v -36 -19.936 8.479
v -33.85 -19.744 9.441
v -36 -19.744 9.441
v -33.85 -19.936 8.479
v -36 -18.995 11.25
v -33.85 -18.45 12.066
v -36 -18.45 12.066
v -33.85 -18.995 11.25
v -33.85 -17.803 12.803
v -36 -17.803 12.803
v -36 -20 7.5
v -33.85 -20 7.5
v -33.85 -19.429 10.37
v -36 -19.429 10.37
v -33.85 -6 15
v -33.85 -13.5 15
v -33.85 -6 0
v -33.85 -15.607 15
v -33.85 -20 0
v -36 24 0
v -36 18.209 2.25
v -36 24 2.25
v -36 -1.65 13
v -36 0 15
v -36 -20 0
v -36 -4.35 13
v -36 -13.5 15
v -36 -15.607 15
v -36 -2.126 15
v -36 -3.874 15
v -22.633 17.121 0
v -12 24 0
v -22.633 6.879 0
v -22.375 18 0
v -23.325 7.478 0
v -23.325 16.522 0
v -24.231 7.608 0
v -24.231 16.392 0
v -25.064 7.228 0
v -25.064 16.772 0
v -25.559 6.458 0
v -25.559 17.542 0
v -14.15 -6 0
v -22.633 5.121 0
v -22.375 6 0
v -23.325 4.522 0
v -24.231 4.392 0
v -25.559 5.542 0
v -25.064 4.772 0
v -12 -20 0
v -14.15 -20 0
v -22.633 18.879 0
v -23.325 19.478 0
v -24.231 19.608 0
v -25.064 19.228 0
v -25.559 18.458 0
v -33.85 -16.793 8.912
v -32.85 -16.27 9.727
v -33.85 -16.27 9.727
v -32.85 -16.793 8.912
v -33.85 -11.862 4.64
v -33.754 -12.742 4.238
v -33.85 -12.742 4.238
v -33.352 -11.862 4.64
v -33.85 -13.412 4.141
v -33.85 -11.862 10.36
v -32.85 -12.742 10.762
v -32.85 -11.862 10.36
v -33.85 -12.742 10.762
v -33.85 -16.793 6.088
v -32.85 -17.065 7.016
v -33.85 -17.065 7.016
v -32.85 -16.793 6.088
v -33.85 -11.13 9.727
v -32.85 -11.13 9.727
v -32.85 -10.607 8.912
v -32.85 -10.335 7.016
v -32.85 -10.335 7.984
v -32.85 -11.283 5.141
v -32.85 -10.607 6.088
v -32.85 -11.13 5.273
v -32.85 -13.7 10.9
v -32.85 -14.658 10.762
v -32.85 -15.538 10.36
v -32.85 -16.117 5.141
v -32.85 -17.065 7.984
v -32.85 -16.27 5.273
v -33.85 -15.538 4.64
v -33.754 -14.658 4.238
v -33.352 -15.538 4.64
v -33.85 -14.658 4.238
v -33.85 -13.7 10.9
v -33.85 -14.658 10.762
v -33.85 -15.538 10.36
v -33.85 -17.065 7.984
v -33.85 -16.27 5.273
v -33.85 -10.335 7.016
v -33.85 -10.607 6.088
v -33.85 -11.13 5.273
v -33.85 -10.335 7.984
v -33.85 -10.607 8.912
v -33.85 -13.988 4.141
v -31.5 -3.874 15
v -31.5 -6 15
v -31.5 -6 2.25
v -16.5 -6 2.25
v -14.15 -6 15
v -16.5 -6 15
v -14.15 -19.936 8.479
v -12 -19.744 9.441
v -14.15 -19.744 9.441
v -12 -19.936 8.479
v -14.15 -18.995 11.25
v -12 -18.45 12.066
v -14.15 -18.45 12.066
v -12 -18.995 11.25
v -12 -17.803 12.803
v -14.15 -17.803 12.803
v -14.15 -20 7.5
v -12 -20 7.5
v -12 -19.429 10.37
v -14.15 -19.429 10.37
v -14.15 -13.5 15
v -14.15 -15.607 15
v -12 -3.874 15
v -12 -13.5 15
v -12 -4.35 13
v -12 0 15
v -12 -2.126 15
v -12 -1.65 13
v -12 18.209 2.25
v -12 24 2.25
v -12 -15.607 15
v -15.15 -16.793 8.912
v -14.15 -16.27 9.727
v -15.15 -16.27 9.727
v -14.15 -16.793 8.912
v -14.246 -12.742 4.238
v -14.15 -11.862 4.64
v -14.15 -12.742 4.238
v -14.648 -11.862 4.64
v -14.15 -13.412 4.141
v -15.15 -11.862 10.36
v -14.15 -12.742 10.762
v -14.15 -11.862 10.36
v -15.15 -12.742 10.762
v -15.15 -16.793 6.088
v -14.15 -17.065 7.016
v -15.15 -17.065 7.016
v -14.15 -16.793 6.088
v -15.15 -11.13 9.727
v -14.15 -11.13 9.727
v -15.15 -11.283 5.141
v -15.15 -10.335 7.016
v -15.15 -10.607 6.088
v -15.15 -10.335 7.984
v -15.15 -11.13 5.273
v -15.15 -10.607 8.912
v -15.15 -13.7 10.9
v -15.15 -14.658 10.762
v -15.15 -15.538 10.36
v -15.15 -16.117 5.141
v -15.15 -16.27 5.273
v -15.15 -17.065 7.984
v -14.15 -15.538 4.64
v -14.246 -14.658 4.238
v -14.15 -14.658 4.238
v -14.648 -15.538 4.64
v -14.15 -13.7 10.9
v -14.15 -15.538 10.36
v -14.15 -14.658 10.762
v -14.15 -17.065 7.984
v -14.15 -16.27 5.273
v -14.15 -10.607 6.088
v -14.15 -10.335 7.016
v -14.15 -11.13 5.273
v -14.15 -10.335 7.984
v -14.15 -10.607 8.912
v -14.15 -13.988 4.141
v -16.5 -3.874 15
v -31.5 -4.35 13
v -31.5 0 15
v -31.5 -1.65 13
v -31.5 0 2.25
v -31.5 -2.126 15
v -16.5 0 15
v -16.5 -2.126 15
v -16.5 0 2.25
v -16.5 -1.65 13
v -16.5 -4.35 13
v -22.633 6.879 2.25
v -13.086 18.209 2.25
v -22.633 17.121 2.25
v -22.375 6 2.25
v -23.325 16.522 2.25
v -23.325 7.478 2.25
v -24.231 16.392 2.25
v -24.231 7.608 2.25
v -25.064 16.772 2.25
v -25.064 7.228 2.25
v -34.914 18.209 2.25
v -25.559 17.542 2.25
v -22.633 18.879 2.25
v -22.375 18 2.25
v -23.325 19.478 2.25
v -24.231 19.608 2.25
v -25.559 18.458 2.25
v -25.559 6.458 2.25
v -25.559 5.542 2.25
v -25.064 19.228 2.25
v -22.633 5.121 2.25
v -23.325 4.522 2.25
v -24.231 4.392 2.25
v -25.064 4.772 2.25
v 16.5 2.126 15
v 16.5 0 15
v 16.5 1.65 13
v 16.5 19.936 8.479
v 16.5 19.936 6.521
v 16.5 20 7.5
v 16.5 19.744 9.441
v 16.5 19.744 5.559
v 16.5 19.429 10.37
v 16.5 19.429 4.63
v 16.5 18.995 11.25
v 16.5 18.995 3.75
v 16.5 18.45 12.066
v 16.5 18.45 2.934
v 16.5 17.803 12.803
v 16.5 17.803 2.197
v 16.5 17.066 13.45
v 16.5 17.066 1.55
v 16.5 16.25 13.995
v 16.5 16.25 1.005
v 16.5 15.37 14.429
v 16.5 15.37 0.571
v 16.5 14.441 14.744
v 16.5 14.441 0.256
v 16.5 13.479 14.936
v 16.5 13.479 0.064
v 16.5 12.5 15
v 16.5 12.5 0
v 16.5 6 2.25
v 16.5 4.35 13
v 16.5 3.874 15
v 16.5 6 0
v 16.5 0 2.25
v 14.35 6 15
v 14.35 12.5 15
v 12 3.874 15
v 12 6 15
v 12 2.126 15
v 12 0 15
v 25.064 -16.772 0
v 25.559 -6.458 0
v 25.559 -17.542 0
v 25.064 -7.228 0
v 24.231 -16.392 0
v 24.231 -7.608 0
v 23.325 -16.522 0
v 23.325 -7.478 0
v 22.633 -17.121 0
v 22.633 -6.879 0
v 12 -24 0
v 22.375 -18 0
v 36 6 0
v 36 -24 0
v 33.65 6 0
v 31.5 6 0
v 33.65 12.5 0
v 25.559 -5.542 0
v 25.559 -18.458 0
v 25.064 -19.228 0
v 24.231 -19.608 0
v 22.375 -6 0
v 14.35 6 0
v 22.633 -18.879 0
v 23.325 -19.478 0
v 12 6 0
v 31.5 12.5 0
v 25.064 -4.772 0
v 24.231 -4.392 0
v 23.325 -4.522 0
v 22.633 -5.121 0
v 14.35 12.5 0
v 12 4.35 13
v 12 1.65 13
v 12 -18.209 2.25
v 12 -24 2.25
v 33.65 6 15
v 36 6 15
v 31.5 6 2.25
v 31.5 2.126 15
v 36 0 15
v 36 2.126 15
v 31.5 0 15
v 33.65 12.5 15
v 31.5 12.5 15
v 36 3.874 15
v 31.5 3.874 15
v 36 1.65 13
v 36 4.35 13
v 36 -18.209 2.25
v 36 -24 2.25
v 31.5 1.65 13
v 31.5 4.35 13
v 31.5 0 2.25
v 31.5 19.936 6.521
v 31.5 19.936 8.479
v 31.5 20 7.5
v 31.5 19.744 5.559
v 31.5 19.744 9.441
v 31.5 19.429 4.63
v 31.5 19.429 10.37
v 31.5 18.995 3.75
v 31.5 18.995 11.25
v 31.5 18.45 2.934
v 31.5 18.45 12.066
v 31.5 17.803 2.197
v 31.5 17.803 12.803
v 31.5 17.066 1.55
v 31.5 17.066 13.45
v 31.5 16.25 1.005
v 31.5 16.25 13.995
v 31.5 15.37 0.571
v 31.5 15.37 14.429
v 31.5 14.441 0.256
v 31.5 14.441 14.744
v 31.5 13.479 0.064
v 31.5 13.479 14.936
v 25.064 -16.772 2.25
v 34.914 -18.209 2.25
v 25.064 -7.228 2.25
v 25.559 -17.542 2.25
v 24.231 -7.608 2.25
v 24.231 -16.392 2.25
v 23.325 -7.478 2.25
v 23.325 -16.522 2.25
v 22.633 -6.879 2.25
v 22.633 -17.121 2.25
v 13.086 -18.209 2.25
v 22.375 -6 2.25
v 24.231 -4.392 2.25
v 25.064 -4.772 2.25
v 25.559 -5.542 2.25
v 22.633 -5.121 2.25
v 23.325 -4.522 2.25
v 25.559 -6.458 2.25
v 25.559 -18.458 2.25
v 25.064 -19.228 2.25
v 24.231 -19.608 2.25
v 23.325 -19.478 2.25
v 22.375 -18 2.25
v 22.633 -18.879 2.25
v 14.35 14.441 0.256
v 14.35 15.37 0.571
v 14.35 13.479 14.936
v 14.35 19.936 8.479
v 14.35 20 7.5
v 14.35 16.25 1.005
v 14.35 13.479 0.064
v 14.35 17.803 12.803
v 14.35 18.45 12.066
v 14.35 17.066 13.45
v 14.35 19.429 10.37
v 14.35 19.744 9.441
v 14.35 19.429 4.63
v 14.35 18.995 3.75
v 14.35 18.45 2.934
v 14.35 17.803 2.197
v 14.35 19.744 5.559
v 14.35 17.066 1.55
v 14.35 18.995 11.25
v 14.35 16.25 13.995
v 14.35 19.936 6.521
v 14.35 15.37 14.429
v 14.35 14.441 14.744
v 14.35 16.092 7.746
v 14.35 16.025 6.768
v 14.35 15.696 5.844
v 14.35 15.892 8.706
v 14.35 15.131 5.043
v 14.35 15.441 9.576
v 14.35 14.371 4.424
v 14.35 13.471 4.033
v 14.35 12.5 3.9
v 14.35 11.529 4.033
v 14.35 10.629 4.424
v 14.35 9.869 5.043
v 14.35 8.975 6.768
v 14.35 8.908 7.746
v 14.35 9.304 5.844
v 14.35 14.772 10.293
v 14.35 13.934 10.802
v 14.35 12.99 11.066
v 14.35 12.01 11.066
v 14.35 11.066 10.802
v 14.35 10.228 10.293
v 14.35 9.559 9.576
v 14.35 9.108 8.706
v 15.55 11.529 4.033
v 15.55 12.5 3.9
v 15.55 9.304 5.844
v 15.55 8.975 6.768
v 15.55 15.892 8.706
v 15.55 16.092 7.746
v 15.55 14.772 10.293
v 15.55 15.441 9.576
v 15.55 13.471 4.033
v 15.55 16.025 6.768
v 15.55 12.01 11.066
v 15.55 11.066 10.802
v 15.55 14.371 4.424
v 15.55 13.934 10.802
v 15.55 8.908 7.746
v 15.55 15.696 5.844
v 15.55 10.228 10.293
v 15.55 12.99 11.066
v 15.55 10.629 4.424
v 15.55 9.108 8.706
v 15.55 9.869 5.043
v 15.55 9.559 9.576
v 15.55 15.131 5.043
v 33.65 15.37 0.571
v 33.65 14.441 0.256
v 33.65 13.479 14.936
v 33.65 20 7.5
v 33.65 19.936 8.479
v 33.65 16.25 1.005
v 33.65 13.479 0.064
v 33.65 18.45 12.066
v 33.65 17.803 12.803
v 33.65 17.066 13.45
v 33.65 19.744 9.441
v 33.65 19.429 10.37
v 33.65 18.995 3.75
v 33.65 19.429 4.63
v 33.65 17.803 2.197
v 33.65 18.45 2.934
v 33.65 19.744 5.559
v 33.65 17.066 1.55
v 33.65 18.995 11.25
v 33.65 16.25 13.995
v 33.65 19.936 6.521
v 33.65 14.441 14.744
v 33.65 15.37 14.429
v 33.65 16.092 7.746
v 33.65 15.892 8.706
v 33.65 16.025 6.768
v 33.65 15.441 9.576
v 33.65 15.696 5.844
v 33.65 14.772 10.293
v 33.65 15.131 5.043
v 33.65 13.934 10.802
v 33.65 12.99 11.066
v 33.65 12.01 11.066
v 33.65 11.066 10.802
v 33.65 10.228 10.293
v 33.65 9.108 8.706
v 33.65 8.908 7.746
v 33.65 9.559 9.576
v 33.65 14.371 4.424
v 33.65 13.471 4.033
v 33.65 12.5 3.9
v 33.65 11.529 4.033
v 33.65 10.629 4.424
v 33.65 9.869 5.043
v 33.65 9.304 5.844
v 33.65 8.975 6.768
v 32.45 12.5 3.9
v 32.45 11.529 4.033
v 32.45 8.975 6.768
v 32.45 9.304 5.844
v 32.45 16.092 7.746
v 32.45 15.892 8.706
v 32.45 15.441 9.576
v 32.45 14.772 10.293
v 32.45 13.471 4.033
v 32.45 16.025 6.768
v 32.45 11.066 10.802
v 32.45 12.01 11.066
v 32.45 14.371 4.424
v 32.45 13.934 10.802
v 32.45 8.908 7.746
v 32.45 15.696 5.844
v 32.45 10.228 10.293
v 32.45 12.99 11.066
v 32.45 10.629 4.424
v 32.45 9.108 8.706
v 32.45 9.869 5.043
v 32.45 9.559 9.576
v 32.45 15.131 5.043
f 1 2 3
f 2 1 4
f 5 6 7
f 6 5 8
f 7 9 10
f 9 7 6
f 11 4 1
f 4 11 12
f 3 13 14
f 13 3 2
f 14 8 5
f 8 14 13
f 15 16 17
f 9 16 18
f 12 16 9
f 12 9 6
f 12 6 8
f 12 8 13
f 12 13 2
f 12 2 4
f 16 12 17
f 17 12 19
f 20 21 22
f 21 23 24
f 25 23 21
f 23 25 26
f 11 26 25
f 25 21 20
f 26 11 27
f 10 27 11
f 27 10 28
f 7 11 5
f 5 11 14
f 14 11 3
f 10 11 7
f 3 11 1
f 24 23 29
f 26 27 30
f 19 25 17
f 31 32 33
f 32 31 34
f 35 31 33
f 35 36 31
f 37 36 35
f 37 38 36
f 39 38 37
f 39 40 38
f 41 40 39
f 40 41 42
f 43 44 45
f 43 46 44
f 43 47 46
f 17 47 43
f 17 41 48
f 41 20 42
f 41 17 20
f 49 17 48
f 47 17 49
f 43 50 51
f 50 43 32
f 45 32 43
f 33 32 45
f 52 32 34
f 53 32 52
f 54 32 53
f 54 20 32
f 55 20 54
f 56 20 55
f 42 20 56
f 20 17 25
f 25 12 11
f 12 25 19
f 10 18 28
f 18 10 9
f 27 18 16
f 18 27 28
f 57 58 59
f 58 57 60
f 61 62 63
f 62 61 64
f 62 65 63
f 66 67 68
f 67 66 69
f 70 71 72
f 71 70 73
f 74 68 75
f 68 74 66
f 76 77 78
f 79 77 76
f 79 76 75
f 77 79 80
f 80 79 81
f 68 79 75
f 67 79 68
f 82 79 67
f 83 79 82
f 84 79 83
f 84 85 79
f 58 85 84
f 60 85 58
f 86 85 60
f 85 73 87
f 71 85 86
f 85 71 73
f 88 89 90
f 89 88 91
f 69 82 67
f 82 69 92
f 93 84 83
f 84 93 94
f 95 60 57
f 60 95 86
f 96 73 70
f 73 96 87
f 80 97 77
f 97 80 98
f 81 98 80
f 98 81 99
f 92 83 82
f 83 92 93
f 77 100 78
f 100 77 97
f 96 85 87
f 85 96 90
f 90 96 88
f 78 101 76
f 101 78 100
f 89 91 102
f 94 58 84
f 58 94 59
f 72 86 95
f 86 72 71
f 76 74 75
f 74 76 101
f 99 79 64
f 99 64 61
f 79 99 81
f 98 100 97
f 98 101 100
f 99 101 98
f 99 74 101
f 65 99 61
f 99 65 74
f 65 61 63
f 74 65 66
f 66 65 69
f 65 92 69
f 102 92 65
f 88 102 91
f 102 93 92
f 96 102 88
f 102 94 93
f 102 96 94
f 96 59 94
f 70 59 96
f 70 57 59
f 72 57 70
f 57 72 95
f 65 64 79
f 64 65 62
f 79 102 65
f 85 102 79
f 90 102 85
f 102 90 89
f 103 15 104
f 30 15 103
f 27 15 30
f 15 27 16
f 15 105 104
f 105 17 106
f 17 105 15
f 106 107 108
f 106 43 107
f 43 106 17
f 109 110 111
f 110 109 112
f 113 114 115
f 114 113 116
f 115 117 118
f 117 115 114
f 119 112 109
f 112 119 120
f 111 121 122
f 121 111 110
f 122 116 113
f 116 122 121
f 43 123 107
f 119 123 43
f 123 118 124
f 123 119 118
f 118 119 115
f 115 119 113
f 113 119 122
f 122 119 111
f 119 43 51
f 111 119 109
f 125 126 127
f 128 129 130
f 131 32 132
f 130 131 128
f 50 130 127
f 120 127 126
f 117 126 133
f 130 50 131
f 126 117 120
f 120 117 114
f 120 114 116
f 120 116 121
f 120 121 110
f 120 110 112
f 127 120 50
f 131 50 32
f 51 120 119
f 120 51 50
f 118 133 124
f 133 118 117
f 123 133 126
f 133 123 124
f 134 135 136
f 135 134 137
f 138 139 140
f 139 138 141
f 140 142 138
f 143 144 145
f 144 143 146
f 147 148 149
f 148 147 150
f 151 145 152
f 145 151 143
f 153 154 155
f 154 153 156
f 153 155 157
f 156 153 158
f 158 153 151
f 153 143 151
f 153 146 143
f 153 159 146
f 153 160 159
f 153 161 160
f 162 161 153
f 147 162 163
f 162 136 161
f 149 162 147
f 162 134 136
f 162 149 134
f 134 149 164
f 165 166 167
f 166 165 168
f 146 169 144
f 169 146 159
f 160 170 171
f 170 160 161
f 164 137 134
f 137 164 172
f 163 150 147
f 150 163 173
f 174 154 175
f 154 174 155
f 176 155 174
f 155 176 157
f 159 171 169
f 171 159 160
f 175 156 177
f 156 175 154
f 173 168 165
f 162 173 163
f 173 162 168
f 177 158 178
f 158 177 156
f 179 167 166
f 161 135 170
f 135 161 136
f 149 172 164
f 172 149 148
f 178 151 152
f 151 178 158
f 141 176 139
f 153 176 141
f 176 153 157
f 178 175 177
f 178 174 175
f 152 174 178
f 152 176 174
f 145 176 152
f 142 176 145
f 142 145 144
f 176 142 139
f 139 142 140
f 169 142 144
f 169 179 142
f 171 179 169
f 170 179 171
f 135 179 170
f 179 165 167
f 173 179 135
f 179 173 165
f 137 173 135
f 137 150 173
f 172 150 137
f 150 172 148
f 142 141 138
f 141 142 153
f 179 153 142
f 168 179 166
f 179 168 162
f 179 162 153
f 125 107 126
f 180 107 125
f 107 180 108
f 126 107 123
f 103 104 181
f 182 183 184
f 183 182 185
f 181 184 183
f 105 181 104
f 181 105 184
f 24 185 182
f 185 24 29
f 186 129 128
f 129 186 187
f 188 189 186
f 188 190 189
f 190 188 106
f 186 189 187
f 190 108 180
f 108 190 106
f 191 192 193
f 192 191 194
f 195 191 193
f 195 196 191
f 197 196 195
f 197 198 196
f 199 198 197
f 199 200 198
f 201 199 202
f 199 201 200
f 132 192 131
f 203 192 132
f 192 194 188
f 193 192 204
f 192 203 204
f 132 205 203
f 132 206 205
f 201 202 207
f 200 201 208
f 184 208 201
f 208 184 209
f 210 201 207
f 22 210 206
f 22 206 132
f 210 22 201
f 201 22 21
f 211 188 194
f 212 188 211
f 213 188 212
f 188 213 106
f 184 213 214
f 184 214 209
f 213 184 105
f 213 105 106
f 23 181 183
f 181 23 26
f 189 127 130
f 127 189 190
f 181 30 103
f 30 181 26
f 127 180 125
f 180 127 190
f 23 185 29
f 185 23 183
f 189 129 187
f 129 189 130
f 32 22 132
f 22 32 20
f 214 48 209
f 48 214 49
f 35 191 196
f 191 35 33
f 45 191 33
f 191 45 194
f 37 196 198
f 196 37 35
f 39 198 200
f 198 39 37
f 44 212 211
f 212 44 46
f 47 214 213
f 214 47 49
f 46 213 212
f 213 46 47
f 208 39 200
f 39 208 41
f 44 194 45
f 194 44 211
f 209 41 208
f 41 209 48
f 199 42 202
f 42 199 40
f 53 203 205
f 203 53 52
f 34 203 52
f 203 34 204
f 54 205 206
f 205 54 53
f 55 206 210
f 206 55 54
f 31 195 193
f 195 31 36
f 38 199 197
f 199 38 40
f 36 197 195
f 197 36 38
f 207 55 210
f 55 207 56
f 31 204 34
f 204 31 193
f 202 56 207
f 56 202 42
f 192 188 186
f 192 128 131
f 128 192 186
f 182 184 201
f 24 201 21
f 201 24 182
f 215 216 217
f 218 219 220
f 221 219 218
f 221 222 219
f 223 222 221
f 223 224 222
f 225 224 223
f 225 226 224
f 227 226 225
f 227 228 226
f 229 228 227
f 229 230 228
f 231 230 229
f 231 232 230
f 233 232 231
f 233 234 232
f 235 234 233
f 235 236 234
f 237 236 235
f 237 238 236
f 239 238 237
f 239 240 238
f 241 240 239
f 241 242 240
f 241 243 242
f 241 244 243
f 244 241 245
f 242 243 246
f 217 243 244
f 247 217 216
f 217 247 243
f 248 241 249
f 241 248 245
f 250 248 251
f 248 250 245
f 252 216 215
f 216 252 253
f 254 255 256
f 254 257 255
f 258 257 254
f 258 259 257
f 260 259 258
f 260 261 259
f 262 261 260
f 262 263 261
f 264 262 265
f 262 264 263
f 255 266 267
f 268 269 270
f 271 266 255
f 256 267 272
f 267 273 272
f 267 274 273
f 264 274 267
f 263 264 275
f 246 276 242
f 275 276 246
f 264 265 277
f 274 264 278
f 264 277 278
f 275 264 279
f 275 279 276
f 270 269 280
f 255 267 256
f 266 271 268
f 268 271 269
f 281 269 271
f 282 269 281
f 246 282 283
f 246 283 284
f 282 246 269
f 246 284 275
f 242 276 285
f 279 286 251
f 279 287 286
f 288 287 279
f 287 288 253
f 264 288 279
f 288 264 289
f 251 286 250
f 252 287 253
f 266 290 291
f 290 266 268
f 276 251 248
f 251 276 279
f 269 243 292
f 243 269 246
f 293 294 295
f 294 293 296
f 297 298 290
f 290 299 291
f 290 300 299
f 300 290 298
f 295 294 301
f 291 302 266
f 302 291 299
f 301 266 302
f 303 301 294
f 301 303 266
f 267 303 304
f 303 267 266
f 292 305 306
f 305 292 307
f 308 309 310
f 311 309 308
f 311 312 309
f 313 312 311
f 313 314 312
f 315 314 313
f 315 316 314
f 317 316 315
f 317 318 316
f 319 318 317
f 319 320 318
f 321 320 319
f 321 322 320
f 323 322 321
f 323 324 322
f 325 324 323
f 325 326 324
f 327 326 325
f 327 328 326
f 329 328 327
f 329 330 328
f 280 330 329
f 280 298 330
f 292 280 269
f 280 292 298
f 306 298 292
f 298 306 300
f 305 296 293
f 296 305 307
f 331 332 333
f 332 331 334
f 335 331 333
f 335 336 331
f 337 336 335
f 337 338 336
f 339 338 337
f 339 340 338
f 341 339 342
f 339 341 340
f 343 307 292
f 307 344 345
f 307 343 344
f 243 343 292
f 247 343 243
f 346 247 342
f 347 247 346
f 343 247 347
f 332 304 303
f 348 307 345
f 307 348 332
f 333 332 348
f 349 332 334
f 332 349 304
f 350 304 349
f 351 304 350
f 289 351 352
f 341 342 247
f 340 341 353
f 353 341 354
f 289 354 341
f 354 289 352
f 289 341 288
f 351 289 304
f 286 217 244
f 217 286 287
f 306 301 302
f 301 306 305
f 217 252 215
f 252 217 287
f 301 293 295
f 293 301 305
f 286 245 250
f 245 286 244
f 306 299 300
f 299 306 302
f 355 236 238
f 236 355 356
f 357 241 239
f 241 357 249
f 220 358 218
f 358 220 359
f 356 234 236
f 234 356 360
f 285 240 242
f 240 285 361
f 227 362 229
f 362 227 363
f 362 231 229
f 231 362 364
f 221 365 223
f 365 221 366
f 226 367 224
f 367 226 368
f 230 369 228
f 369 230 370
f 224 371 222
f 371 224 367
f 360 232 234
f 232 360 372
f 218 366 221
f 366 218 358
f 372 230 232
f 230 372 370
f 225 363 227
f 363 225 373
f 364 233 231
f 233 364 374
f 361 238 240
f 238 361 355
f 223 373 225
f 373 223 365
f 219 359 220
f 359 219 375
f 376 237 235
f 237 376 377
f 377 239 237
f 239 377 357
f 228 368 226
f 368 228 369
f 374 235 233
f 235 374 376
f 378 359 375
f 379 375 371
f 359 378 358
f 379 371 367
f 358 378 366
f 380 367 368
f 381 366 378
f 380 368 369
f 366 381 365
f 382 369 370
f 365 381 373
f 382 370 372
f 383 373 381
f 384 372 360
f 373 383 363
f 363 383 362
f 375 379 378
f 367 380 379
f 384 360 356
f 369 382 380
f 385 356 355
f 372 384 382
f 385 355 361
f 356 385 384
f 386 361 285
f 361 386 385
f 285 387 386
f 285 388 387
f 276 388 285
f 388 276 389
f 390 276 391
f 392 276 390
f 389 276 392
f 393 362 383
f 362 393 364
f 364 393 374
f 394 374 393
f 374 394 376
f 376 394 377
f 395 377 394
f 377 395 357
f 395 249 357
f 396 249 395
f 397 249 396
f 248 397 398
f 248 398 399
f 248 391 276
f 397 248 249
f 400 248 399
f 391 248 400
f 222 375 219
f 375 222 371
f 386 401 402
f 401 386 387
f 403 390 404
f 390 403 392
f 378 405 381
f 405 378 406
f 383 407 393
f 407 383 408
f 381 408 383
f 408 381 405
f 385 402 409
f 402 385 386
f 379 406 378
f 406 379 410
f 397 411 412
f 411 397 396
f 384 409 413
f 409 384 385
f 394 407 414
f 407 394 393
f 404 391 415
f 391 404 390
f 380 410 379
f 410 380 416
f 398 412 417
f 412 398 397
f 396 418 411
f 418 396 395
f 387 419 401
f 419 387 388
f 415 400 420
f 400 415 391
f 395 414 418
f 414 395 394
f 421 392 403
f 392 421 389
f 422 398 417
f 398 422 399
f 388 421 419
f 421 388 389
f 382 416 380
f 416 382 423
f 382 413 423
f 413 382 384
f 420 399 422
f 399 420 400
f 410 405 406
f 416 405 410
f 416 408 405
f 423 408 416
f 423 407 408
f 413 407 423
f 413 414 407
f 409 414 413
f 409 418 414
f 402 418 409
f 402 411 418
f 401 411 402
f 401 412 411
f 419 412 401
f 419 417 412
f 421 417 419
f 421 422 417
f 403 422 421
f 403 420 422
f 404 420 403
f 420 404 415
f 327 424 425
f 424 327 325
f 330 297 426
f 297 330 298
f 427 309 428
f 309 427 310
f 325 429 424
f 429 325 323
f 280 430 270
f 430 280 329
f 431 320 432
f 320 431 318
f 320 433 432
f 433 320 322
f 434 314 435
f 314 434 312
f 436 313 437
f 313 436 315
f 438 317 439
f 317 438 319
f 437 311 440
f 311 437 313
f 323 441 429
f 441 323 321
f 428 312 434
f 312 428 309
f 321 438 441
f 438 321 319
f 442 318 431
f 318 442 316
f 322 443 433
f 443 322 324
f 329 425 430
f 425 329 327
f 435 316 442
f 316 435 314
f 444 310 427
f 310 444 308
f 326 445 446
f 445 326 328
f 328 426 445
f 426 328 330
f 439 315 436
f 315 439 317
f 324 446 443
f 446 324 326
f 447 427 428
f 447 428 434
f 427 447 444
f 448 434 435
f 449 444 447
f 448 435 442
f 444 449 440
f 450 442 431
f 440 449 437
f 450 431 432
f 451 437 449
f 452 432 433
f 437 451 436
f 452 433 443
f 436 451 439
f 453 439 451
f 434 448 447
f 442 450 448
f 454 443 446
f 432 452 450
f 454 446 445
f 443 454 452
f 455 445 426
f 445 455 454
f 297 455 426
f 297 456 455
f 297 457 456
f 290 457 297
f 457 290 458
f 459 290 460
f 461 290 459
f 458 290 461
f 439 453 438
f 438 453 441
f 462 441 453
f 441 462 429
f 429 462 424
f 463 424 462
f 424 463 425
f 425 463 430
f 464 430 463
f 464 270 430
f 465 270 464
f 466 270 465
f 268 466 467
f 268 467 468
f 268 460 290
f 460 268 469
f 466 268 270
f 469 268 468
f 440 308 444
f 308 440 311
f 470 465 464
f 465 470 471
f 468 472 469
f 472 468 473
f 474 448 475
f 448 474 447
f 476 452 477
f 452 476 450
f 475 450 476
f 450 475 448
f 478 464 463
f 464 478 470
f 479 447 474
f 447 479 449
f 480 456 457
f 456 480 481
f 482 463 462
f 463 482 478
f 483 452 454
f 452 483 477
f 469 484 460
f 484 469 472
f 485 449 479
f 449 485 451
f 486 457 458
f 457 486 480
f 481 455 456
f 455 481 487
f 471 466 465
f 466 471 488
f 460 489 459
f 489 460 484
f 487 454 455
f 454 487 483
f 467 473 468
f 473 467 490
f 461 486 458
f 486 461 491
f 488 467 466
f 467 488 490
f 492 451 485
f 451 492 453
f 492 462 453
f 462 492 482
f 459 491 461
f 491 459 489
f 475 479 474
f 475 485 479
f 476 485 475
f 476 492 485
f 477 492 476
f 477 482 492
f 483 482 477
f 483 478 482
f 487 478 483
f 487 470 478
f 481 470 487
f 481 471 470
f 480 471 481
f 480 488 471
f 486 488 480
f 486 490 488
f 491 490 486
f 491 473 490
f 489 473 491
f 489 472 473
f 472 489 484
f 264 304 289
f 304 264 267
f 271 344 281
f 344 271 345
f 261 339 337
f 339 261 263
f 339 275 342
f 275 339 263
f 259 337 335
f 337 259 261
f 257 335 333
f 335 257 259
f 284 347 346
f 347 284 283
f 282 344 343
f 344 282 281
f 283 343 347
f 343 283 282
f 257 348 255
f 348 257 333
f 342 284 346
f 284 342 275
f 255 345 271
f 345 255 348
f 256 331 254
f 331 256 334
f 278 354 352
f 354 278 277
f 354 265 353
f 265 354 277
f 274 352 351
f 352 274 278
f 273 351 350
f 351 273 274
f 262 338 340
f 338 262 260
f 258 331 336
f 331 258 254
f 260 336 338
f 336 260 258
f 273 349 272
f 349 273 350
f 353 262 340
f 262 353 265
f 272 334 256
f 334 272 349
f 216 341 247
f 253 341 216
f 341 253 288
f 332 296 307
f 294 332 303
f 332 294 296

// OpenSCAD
// file: parameters.scad
tolerance = .2;

outer_width = 24;
outer_height = 15;

mid_depth = 6;

wall_thickness = 2.25;

key_diameter = 7;
key_depth = 1.1;
key_slope_bottom = 45;

clip_thickness = 2;
clip_curve_thickness = 1.75;

_trim = 1;

$fa = 3;
$fs = 1;
// file: link.scad
include<parameters.scad>;

module notch_profile(with_tolerance=false) {
    polygon([
        [clip_thickness,
         -1.25 - (with_tolerance ? tolerance/2 : 0)],
        [(with_tolerance ? -.1 : 0),
         -.75 - (with_tolerance ? tolerance/2 : 0)],
        [(with_tolerance ? -.1 : 0),
         .75 + (with_tolerance ? tolerance/2 : 0)],
        [clip_thickness,
         1.25 + (with_tolerance ? tolerance/2 : 0)]
    ]);
}

module link_back() {
    union()
    translate([0, 0, outer_height/2])
    for(n=[0, 1])
    mirror([n, 0, 0])
    translate([-outer_width/2, 0, 0])
    union() {
        translate([0, _trim, 0])
        union() {
            difference() {
                translate([0, -outer_height/2, 0])
                rotate([0, 90, 0])
                cylinder(d=outer_height, h=wall_thickness-tolerance/2);

                translate([-.1, -outer_height/2, -outer_height/2])
                cube([wall_thickness+.2, outer_height/2, outer_height]);
            }

            translate([0, -outer_height, -outer_height/2])
            cube([wall_thickness-tolerance/2, outer_height/2, outer_height/2]);

            radius = (outer_height/2);
            translate([0, -(radius*(1+cos(45))), radius*sin(45)])
            rotate([90, 0, 90])
            linear_extrude(height=wall_thickness-tolerance/2)
            polygon([
                [0, 0],
                [radius*(1-sin(45)), radius*(1-sin(45))],
                [radius*cos(45), radius*(1-sin(45))],
                [radius*cos(45), 0]
            ]);
        }

        translate([0, -outer_height/2, -outer_height/2])
        cube([wall_thickness-tolerance/2, outer_height/2, outer_height]);

        // key
        translate([0, -outer_height/2-tolerance, 0])
        rotate([0, 90, 0])
        translate([0, 0, wall_thickness-.1])
        difference() {
            cylinder(d=key_diameter-tolerance, h=key_depth+.1-tolerance);

            translate([key_diameter/2, -key_diameter/2-1, 0])
            rotate([0, 270-key_slope_bottom, 0])
            translate([0, 0,-.9])
            cube([10,10,1]);
        }
    }
}

module link_mid() {
    translate([0, -mid_depth, 0])
    difference() {
        union() {
            translate([0, 0, outer_height/2])
            for(n=[0, 1])
            mirror([n, 0, 0])
            translate([-outer_width/2, 0, -outer_height/2])
            cube([wall_thickness * 2, mid_depth, outer_height]);

            translate([-outer_width/2, 0, 0])
            cube([outer_width, mid_depth, wall_thickness]);
        }

        translate([-outer_width/2-.5, mid_depth/2, outer_height])
        rotate([0, 90, 0])
        linear_extrude(height=outer_width+1)
        notch_profile(true);
    }
}

module link_front() {
    union()
    translate([0, 0, outer_height/2])
    for(n=[0, 1])
    mirror([n, 0, 0])
    translate([-outer_width/2 + wall_thickness, 0, 0])
    difference() {
        union() {
            translate([0, -_trim, 0])
            difference() {
                translate([tolerance/2, outer_height/2, 0])
                rotate([0, 90, 0])
                cylinder(d=outer_height, h=wall_thickness-tolerance/2);

                translate([tolerance-.1, 0, -outer_height/2])
                cube([wall_thickness-tolerance+.2, outer_height/2, outer_height]);
            }

            translate([tolerance/2, 0, -outer_height/2])
            cube([wall_thickness-tolerance/2, outer_height/2-_trim, outer_height]);
        }

        // keyhole
        translate([0, outer_height/2-_trim, 0])
        rotate([0, 90, 0])
        translate([0, 0, -.1])
        cylinder(d=key_diameter+tolerance, h=key_depth+.1+tolerance);
    }
}

module clip() {
    union() {
        for(r=[0, 180])
        rotate([0, 0, r]) {
            translate([outer_width/2-wall_thickness*2.5, 0, clip_thickness])
            rotate([0, 90, 0])
            linear_extrude(height=wall_thickness+.25)
            notch_profile(false);

            translate([outer_width/2-wall_thickness*2-clip_curve_thickness, -1.5, 0])
            cube([clip_curve_thickness, 3, clip_thickness]);

            translate([-clip_curve_thickness/2, -clip_curve_thickness, 0])
            cube([clip_curve_thickness, clip_curve_thickness*2, clip_thickness]);

            cyl_radius=(outer_width-wall_thickness*4+clip_curve_thickness)/4;

            translate([cyl_radius-clip_curve_thickness/2, 1, 0])
            difference() {
                cylinder(r=cyl_radius, h=clip_thickness);

                translate([0, 0, -.1])
                cylinder(r=cyl_radius-clip_curve_thickness, h=clip_thickness+.2);

                translate([-outer_width/2, -outer_width/2, -.1])
                cube([outer_width, outer_width/2, clip_thickness + .2]);
            }
        }
    }
}

module full_link() {
    union() {
        translate([0, -mid_depth, 0])
        link_back();
        link_mid();
        link_front();
    }
}

//translate([0, -mid_depth/2, outer_height-clip_thickness])
translate([outer_width, 0, 0])
clip();

full_link();
// main file
use<link.scad>;

include<parameters.scad>;

screw_hole_diameter = 3.25;

overlap = .5;

module mount_end() {
    difference() {
        //baseplate
        translate([-outer_width/2, -overlap, 0])
        cube([outer_width, outer_width+overlap, wall_thickness]);

        // inner screw hole
        translate([0, outer_width/4, -.1])
        cylinder(d=screw_hole_diameter, h=wall_thickness+.2);

        // outer screw hole
        translate([0, outer_width/4*3, -.1])
        cylinder(d=screw_hole_diameter, h=wall_thickness+.2);
    }

    //vertical walls
    for(n=[0, 1])
    mirror([n, 0, 0])
    translate([outer_width/2-wall_thickness*2, 0, 0])
    difference() {
        // bevelled wall
        linear_extrude(height=outer_height)
        polygon([
            [0, 0],
            [wall_thickness*2, outer_width],
            [wall_thickness*2, 0],
            [wall_thickness*2, -overlap],
            [0, -overlap]
        ]);
        // slope cut
        translate([-.1, 0, outer_height])
        rotate([-35, 0, 0])
        cube([wall_thickness*2+.2, outer_width*2, outer_height]);
    }
}

// male end
translate([-outer_width, 0, 0])
union() {
    translate([0, -mid_depth, 0])
    link_back();
    link_mid();
    mount_end();
}

// female end
translate([outer_width, 0, 0])
union() {
    translate([0, mid_depth, 0])
    union() {
        link_mid();
        link_front();
    }

    rotate([0, 0, 180])
    mount_end();
}
